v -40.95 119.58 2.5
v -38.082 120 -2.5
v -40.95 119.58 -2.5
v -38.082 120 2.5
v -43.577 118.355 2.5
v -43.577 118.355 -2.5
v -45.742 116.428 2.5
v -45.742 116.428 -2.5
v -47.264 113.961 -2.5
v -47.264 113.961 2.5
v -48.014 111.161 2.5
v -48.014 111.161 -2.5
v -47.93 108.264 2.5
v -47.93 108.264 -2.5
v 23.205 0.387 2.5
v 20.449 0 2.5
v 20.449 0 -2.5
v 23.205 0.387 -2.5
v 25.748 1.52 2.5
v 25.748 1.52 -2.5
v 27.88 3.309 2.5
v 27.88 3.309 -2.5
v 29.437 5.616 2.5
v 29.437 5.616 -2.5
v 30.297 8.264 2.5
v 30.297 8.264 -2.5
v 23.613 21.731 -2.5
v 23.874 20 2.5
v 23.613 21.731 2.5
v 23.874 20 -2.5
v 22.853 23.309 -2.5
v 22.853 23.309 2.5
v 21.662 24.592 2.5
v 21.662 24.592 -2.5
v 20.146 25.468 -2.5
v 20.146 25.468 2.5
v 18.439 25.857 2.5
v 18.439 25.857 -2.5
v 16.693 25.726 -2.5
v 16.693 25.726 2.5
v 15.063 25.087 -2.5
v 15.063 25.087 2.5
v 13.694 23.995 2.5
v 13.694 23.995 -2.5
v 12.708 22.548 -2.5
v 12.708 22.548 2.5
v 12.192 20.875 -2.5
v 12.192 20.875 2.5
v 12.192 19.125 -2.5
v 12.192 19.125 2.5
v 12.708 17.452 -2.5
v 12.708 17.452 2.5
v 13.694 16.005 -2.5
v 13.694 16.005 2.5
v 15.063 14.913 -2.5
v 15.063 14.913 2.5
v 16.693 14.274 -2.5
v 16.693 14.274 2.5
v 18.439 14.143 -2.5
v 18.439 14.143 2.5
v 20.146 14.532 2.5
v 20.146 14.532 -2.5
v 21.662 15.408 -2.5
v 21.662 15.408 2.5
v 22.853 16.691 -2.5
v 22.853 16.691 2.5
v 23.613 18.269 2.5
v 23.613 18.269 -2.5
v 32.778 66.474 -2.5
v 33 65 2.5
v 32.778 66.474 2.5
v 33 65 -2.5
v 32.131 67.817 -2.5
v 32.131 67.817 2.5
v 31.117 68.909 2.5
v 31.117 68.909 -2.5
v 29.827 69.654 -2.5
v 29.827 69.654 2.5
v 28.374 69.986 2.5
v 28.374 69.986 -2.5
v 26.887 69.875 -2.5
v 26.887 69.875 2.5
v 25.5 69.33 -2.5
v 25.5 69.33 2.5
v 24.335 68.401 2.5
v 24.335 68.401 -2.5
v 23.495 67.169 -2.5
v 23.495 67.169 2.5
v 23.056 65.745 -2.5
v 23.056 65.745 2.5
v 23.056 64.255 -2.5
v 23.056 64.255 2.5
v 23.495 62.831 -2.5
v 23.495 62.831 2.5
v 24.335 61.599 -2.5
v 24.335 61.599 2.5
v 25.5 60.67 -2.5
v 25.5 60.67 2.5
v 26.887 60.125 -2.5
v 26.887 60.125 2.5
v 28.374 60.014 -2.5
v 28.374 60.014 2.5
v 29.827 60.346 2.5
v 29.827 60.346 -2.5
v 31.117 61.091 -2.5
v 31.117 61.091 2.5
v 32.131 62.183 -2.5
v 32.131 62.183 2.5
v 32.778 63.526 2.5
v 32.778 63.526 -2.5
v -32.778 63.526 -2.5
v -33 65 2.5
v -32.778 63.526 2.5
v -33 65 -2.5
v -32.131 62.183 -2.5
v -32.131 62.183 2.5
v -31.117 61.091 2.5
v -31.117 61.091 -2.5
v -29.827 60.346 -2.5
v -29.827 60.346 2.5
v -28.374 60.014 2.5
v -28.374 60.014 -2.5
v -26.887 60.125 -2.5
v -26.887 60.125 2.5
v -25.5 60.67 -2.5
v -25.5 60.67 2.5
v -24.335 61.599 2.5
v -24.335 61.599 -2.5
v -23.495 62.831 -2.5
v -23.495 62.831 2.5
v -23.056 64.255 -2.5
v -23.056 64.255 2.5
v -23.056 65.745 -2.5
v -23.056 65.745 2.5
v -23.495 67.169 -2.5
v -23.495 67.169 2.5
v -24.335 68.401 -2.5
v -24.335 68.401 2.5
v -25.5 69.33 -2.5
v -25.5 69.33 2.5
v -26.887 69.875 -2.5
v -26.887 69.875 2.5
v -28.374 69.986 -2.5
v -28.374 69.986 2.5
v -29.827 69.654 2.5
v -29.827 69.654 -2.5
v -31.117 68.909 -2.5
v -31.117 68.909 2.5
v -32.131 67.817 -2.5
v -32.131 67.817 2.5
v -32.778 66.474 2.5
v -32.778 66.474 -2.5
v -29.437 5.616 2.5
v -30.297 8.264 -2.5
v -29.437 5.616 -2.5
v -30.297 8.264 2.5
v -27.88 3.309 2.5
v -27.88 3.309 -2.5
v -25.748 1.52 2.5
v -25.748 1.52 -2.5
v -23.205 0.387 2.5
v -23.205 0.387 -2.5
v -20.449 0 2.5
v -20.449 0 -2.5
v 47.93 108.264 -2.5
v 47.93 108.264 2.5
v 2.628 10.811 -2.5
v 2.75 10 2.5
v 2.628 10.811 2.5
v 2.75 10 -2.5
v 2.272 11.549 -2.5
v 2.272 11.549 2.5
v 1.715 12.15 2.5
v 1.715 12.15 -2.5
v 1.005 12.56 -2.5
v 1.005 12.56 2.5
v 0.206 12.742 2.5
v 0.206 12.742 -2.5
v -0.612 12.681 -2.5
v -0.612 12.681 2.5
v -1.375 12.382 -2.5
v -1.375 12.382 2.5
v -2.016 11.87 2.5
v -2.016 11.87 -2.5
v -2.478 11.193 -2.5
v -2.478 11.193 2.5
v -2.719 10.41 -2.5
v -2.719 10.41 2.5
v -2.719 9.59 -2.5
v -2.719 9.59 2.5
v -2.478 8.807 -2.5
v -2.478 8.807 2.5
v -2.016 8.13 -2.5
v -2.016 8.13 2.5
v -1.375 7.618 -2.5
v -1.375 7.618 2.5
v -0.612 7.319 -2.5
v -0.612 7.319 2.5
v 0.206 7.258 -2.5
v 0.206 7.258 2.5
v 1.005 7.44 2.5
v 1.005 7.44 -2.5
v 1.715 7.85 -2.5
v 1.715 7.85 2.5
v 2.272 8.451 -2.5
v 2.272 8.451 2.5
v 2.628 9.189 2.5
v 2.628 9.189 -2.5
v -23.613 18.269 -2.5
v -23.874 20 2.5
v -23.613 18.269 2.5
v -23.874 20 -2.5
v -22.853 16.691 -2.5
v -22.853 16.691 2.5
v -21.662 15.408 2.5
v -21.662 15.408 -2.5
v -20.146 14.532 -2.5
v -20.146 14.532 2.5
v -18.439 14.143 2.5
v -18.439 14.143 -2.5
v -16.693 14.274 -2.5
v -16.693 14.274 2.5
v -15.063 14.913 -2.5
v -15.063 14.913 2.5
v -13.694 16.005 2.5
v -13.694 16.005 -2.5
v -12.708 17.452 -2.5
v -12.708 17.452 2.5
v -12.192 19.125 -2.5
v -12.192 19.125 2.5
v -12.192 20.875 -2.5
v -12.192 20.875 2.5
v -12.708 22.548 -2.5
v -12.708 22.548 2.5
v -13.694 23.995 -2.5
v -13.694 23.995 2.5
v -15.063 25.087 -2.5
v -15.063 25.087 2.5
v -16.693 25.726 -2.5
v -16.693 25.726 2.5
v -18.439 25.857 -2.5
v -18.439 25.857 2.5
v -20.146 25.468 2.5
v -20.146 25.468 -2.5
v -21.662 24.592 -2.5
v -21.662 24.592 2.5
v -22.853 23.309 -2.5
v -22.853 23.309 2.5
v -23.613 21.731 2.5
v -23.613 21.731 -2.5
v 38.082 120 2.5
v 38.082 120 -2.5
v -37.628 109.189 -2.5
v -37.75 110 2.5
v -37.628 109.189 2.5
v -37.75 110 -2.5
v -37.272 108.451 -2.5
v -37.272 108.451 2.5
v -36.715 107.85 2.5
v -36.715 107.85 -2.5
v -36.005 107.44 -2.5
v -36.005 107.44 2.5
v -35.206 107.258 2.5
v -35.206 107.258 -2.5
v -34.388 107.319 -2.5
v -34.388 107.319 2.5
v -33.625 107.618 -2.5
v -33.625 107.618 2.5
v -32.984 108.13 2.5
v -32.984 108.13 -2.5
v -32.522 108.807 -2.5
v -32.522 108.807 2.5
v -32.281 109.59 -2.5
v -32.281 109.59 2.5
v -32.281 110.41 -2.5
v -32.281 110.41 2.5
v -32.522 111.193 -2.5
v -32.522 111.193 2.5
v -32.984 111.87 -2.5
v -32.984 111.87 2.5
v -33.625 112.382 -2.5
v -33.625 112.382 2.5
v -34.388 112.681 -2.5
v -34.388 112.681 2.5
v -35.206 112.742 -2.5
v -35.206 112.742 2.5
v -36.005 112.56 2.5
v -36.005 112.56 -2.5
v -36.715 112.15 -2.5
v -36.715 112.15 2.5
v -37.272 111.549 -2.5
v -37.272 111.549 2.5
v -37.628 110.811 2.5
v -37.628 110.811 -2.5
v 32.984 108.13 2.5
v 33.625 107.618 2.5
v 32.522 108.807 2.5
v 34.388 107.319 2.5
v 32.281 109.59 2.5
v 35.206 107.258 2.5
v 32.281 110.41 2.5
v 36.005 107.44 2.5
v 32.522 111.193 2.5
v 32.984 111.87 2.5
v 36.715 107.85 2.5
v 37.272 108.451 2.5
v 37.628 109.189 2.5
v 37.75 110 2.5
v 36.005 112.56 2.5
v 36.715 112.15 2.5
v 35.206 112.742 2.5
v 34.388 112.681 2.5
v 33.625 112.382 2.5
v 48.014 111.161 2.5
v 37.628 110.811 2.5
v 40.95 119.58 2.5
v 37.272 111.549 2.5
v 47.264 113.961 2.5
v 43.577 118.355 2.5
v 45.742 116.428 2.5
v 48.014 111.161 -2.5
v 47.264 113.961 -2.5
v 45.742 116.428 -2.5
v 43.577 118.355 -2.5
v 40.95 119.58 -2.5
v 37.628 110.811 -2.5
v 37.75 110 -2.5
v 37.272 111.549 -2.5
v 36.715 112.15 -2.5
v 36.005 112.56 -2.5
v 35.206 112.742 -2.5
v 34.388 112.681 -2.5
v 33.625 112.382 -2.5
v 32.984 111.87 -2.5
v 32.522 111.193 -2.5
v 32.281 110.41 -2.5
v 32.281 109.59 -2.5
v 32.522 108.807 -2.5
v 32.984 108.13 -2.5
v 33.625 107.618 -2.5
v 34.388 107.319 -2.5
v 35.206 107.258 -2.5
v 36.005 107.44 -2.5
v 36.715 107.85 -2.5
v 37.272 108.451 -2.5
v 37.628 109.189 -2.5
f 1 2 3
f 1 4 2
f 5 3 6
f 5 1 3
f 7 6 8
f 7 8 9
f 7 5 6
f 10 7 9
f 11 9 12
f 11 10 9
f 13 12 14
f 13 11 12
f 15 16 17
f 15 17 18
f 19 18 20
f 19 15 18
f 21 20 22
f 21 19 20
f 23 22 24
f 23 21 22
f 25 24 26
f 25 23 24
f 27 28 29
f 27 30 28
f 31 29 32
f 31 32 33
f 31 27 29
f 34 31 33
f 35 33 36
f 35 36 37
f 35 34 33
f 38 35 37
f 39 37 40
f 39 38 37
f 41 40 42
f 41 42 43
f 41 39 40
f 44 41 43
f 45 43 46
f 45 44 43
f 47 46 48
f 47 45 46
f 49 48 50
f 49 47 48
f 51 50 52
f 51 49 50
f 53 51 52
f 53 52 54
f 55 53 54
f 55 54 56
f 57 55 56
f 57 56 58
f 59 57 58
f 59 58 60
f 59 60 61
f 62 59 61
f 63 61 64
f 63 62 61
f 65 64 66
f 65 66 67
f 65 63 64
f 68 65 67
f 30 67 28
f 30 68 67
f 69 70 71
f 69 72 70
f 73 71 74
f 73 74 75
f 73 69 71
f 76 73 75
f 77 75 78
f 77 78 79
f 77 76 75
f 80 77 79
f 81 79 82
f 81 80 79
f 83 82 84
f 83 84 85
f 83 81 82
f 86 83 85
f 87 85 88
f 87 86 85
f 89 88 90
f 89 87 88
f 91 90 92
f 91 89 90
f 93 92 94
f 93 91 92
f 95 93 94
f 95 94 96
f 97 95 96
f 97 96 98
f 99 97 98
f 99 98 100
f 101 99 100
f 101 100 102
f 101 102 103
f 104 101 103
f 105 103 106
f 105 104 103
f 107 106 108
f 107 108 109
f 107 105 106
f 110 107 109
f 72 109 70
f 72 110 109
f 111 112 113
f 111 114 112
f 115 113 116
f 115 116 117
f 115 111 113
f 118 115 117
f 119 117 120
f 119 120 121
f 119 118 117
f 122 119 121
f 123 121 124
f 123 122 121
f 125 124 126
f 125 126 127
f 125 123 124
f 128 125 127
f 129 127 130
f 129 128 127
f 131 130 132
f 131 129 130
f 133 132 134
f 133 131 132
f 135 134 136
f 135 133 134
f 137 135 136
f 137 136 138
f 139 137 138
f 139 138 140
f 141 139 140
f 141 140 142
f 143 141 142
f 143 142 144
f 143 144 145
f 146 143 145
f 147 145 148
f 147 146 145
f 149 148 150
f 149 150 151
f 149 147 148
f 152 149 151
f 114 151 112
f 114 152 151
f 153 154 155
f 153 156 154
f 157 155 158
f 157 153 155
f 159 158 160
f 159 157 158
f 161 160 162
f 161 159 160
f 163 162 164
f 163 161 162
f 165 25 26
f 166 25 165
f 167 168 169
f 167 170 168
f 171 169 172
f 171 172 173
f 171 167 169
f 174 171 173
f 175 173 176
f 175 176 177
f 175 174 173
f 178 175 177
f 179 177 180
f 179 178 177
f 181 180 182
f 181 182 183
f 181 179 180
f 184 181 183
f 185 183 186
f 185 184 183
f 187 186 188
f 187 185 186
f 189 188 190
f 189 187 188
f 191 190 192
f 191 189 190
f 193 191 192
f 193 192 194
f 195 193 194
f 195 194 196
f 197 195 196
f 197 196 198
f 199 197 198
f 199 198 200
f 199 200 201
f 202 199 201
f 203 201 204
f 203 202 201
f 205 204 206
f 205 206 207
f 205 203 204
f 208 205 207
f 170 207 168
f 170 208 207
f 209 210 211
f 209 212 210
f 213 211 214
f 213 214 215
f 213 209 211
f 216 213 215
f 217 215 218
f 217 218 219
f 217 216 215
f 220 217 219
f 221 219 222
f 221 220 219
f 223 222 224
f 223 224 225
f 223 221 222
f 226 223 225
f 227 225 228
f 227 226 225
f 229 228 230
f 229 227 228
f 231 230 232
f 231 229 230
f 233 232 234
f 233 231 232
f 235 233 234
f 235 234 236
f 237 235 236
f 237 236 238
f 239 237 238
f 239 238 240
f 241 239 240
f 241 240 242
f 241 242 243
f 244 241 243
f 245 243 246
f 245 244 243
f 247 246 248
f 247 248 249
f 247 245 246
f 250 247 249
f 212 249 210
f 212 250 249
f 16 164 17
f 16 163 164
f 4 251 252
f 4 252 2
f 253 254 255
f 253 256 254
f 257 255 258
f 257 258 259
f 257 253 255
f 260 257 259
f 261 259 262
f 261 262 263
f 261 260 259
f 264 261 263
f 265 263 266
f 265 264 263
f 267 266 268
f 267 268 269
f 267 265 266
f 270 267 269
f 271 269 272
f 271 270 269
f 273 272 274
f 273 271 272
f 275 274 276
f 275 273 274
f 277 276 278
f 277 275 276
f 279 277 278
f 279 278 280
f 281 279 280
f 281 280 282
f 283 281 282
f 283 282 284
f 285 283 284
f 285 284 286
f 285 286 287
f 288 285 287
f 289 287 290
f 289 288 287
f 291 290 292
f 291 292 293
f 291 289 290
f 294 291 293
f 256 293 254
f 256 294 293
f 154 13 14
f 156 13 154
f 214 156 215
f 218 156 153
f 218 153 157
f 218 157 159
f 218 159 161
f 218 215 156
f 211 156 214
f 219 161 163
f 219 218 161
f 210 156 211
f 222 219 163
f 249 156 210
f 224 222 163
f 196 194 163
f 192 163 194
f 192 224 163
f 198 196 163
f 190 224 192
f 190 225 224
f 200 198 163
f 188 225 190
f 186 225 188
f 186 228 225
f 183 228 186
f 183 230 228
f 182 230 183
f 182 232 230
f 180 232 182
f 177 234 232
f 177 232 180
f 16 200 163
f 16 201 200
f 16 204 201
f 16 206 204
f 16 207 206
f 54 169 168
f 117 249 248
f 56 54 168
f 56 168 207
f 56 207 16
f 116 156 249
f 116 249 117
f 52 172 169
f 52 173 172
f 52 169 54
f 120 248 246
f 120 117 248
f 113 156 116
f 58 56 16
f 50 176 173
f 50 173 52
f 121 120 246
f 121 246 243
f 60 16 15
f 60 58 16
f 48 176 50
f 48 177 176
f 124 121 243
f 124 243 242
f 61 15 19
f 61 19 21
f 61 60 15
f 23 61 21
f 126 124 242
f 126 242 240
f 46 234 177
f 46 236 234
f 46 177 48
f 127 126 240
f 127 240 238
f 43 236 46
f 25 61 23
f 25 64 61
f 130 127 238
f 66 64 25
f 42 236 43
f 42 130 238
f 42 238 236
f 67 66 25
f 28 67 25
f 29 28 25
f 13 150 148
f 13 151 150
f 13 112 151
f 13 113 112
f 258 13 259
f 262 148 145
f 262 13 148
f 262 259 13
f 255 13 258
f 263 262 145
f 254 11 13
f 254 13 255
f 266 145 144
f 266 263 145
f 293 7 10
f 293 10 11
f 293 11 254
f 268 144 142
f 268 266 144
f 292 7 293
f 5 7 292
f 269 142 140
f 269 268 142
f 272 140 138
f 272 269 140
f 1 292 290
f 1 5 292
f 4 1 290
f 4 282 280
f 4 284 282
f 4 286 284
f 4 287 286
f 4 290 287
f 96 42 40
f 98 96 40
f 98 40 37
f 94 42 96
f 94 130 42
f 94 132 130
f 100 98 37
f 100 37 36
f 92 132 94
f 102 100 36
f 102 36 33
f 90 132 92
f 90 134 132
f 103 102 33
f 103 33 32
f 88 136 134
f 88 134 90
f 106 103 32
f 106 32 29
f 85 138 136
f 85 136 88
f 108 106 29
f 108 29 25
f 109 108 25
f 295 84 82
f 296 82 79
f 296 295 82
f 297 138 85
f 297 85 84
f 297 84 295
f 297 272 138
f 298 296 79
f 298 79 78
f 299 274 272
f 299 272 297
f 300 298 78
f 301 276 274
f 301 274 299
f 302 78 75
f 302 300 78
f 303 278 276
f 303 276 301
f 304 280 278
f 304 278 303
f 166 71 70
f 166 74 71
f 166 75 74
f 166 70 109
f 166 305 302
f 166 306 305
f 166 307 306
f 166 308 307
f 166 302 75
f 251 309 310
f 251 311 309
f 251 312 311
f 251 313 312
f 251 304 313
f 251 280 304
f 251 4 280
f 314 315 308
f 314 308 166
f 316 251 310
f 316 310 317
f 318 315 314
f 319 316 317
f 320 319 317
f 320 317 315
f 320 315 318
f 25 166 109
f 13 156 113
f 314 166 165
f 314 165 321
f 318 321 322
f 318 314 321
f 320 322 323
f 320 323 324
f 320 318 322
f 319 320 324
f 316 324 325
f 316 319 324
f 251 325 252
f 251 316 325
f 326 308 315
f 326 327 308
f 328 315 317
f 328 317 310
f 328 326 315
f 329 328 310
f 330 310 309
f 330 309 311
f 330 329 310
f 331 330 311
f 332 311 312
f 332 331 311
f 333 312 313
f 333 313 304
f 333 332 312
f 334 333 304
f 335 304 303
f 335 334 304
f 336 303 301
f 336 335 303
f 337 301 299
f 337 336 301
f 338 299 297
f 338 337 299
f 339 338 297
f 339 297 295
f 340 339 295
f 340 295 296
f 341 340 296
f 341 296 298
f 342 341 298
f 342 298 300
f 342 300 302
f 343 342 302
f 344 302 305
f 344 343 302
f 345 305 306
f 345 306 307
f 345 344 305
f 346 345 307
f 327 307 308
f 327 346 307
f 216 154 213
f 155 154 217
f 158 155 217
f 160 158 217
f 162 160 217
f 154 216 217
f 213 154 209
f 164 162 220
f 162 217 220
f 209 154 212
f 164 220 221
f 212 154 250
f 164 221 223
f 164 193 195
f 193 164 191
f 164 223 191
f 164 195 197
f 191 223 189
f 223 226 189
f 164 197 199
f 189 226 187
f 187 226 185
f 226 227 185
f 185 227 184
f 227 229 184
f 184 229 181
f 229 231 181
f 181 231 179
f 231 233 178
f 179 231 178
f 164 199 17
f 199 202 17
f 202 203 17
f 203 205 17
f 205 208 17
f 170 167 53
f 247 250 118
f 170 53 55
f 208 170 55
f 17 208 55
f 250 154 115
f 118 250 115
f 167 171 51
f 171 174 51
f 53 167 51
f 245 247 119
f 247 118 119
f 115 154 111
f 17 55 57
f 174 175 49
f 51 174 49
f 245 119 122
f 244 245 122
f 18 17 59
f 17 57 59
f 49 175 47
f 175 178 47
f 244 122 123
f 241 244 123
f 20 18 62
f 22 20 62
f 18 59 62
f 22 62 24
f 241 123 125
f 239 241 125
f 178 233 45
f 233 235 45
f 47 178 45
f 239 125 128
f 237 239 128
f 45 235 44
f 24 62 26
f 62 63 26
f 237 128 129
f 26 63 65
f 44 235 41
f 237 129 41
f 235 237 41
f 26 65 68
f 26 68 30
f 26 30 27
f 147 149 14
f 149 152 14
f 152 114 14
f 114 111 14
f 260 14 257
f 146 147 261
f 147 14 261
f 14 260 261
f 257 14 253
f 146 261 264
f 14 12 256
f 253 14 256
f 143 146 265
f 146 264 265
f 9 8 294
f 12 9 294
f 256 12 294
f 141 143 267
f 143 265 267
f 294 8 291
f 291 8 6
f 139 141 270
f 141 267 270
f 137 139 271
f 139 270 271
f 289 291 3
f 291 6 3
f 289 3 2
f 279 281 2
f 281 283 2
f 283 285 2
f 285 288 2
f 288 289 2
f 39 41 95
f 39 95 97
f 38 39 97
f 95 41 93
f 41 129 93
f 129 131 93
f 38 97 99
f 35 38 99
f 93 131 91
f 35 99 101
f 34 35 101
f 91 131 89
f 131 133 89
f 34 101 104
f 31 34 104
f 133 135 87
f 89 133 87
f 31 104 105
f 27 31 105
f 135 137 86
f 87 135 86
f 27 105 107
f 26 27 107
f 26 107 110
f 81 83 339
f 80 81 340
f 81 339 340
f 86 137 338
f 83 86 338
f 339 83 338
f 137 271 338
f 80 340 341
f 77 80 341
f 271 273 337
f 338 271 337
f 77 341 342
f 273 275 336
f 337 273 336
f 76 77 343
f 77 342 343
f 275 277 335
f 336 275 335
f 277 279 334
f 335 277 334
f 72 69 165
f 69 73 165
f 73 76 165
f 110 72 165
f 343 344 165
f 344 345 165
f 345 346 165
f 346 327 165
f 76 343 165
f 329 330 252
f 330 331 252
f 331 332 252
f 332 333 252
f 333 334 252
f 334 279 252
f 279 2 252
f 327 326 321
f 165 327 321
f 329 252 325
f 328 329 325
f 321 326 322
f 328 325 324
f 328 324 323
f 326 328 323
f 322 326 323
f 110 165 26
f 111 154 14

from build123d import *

# Parameters (mm, degrees)
SKETCH1_R           = 5
SKETCH1_R_2         = 5.873519116
SKETCH1_R_3         = 2.75
BOSS_EXTRUDE1_DEPTH = 2.5


with BuildPart() as part:
    # Sketch1 → Boss-Extrude1 (new, symmetric)
    with BuildSketch(Plane.XY):
        with BuildLine():
            Line((-20.449003688, 0), (20.449003688, 0))
            ThreePointArc((20.449003688, 0), (26.876879785, 2.339555569), (30.297081218, 8.263518223))
            Line((30.297081218, 8.263518223), (47.929779289, 108.263518223))
            ThreePointArc((47.929779289, 108.263518223), (45.74214619, 116.427876097), (38.081701759, 120))
            Line((38.081701759, 120), (-38.081701759, 120))
            ThreePointArc((-38.081701759, 120), (-45.74214619, 116.427876097), (-47.929779289, 108.263518223))
            Line((-47.929779289, 108.263518223), (-30.297081218, 8.263518223))
            ThreePointArc((-30.297081218, 8.263518223), (-26.876879785, 2.339555569), (-20.449003688, 0))
        make_face()
        with Locations((28, 65)):
            Circle(SKETCH1_R, mode=Mode.SUBTRACT)
        with Locations((18, 20)):
            Circle(SKETCH1_R_2, mode=Mode.SUBTRACT)
        with Locations((0, 10)):
            Circle(SKETCH1_R_3, mode=Mode.SUBTRACT)
        with Locations((35, 110)):
            Circle(SKETCH1_R_3, mode=Mode.SUBTRACT)
        with Locations(Location((-18, 20, 0), (0, 0, 180))):
            Circle(SKETCH1_R_2, mode=Mode.SUBTRACT)
        with Locations(Location((-28, 65, 0), (0, 0, 180))):
            Circle(SKETCH1_R, mode=Mode.SUBTRACT)
        with Locations(Location((-35, 110, 0), (0, 0, 180))):
            Circle(SKETCH1_R_3, mode=Mode.SUBTRACT)
    extrude(amount=BOSS_EXTRUDE1_DEPTH, both=True)


solid = part.part
